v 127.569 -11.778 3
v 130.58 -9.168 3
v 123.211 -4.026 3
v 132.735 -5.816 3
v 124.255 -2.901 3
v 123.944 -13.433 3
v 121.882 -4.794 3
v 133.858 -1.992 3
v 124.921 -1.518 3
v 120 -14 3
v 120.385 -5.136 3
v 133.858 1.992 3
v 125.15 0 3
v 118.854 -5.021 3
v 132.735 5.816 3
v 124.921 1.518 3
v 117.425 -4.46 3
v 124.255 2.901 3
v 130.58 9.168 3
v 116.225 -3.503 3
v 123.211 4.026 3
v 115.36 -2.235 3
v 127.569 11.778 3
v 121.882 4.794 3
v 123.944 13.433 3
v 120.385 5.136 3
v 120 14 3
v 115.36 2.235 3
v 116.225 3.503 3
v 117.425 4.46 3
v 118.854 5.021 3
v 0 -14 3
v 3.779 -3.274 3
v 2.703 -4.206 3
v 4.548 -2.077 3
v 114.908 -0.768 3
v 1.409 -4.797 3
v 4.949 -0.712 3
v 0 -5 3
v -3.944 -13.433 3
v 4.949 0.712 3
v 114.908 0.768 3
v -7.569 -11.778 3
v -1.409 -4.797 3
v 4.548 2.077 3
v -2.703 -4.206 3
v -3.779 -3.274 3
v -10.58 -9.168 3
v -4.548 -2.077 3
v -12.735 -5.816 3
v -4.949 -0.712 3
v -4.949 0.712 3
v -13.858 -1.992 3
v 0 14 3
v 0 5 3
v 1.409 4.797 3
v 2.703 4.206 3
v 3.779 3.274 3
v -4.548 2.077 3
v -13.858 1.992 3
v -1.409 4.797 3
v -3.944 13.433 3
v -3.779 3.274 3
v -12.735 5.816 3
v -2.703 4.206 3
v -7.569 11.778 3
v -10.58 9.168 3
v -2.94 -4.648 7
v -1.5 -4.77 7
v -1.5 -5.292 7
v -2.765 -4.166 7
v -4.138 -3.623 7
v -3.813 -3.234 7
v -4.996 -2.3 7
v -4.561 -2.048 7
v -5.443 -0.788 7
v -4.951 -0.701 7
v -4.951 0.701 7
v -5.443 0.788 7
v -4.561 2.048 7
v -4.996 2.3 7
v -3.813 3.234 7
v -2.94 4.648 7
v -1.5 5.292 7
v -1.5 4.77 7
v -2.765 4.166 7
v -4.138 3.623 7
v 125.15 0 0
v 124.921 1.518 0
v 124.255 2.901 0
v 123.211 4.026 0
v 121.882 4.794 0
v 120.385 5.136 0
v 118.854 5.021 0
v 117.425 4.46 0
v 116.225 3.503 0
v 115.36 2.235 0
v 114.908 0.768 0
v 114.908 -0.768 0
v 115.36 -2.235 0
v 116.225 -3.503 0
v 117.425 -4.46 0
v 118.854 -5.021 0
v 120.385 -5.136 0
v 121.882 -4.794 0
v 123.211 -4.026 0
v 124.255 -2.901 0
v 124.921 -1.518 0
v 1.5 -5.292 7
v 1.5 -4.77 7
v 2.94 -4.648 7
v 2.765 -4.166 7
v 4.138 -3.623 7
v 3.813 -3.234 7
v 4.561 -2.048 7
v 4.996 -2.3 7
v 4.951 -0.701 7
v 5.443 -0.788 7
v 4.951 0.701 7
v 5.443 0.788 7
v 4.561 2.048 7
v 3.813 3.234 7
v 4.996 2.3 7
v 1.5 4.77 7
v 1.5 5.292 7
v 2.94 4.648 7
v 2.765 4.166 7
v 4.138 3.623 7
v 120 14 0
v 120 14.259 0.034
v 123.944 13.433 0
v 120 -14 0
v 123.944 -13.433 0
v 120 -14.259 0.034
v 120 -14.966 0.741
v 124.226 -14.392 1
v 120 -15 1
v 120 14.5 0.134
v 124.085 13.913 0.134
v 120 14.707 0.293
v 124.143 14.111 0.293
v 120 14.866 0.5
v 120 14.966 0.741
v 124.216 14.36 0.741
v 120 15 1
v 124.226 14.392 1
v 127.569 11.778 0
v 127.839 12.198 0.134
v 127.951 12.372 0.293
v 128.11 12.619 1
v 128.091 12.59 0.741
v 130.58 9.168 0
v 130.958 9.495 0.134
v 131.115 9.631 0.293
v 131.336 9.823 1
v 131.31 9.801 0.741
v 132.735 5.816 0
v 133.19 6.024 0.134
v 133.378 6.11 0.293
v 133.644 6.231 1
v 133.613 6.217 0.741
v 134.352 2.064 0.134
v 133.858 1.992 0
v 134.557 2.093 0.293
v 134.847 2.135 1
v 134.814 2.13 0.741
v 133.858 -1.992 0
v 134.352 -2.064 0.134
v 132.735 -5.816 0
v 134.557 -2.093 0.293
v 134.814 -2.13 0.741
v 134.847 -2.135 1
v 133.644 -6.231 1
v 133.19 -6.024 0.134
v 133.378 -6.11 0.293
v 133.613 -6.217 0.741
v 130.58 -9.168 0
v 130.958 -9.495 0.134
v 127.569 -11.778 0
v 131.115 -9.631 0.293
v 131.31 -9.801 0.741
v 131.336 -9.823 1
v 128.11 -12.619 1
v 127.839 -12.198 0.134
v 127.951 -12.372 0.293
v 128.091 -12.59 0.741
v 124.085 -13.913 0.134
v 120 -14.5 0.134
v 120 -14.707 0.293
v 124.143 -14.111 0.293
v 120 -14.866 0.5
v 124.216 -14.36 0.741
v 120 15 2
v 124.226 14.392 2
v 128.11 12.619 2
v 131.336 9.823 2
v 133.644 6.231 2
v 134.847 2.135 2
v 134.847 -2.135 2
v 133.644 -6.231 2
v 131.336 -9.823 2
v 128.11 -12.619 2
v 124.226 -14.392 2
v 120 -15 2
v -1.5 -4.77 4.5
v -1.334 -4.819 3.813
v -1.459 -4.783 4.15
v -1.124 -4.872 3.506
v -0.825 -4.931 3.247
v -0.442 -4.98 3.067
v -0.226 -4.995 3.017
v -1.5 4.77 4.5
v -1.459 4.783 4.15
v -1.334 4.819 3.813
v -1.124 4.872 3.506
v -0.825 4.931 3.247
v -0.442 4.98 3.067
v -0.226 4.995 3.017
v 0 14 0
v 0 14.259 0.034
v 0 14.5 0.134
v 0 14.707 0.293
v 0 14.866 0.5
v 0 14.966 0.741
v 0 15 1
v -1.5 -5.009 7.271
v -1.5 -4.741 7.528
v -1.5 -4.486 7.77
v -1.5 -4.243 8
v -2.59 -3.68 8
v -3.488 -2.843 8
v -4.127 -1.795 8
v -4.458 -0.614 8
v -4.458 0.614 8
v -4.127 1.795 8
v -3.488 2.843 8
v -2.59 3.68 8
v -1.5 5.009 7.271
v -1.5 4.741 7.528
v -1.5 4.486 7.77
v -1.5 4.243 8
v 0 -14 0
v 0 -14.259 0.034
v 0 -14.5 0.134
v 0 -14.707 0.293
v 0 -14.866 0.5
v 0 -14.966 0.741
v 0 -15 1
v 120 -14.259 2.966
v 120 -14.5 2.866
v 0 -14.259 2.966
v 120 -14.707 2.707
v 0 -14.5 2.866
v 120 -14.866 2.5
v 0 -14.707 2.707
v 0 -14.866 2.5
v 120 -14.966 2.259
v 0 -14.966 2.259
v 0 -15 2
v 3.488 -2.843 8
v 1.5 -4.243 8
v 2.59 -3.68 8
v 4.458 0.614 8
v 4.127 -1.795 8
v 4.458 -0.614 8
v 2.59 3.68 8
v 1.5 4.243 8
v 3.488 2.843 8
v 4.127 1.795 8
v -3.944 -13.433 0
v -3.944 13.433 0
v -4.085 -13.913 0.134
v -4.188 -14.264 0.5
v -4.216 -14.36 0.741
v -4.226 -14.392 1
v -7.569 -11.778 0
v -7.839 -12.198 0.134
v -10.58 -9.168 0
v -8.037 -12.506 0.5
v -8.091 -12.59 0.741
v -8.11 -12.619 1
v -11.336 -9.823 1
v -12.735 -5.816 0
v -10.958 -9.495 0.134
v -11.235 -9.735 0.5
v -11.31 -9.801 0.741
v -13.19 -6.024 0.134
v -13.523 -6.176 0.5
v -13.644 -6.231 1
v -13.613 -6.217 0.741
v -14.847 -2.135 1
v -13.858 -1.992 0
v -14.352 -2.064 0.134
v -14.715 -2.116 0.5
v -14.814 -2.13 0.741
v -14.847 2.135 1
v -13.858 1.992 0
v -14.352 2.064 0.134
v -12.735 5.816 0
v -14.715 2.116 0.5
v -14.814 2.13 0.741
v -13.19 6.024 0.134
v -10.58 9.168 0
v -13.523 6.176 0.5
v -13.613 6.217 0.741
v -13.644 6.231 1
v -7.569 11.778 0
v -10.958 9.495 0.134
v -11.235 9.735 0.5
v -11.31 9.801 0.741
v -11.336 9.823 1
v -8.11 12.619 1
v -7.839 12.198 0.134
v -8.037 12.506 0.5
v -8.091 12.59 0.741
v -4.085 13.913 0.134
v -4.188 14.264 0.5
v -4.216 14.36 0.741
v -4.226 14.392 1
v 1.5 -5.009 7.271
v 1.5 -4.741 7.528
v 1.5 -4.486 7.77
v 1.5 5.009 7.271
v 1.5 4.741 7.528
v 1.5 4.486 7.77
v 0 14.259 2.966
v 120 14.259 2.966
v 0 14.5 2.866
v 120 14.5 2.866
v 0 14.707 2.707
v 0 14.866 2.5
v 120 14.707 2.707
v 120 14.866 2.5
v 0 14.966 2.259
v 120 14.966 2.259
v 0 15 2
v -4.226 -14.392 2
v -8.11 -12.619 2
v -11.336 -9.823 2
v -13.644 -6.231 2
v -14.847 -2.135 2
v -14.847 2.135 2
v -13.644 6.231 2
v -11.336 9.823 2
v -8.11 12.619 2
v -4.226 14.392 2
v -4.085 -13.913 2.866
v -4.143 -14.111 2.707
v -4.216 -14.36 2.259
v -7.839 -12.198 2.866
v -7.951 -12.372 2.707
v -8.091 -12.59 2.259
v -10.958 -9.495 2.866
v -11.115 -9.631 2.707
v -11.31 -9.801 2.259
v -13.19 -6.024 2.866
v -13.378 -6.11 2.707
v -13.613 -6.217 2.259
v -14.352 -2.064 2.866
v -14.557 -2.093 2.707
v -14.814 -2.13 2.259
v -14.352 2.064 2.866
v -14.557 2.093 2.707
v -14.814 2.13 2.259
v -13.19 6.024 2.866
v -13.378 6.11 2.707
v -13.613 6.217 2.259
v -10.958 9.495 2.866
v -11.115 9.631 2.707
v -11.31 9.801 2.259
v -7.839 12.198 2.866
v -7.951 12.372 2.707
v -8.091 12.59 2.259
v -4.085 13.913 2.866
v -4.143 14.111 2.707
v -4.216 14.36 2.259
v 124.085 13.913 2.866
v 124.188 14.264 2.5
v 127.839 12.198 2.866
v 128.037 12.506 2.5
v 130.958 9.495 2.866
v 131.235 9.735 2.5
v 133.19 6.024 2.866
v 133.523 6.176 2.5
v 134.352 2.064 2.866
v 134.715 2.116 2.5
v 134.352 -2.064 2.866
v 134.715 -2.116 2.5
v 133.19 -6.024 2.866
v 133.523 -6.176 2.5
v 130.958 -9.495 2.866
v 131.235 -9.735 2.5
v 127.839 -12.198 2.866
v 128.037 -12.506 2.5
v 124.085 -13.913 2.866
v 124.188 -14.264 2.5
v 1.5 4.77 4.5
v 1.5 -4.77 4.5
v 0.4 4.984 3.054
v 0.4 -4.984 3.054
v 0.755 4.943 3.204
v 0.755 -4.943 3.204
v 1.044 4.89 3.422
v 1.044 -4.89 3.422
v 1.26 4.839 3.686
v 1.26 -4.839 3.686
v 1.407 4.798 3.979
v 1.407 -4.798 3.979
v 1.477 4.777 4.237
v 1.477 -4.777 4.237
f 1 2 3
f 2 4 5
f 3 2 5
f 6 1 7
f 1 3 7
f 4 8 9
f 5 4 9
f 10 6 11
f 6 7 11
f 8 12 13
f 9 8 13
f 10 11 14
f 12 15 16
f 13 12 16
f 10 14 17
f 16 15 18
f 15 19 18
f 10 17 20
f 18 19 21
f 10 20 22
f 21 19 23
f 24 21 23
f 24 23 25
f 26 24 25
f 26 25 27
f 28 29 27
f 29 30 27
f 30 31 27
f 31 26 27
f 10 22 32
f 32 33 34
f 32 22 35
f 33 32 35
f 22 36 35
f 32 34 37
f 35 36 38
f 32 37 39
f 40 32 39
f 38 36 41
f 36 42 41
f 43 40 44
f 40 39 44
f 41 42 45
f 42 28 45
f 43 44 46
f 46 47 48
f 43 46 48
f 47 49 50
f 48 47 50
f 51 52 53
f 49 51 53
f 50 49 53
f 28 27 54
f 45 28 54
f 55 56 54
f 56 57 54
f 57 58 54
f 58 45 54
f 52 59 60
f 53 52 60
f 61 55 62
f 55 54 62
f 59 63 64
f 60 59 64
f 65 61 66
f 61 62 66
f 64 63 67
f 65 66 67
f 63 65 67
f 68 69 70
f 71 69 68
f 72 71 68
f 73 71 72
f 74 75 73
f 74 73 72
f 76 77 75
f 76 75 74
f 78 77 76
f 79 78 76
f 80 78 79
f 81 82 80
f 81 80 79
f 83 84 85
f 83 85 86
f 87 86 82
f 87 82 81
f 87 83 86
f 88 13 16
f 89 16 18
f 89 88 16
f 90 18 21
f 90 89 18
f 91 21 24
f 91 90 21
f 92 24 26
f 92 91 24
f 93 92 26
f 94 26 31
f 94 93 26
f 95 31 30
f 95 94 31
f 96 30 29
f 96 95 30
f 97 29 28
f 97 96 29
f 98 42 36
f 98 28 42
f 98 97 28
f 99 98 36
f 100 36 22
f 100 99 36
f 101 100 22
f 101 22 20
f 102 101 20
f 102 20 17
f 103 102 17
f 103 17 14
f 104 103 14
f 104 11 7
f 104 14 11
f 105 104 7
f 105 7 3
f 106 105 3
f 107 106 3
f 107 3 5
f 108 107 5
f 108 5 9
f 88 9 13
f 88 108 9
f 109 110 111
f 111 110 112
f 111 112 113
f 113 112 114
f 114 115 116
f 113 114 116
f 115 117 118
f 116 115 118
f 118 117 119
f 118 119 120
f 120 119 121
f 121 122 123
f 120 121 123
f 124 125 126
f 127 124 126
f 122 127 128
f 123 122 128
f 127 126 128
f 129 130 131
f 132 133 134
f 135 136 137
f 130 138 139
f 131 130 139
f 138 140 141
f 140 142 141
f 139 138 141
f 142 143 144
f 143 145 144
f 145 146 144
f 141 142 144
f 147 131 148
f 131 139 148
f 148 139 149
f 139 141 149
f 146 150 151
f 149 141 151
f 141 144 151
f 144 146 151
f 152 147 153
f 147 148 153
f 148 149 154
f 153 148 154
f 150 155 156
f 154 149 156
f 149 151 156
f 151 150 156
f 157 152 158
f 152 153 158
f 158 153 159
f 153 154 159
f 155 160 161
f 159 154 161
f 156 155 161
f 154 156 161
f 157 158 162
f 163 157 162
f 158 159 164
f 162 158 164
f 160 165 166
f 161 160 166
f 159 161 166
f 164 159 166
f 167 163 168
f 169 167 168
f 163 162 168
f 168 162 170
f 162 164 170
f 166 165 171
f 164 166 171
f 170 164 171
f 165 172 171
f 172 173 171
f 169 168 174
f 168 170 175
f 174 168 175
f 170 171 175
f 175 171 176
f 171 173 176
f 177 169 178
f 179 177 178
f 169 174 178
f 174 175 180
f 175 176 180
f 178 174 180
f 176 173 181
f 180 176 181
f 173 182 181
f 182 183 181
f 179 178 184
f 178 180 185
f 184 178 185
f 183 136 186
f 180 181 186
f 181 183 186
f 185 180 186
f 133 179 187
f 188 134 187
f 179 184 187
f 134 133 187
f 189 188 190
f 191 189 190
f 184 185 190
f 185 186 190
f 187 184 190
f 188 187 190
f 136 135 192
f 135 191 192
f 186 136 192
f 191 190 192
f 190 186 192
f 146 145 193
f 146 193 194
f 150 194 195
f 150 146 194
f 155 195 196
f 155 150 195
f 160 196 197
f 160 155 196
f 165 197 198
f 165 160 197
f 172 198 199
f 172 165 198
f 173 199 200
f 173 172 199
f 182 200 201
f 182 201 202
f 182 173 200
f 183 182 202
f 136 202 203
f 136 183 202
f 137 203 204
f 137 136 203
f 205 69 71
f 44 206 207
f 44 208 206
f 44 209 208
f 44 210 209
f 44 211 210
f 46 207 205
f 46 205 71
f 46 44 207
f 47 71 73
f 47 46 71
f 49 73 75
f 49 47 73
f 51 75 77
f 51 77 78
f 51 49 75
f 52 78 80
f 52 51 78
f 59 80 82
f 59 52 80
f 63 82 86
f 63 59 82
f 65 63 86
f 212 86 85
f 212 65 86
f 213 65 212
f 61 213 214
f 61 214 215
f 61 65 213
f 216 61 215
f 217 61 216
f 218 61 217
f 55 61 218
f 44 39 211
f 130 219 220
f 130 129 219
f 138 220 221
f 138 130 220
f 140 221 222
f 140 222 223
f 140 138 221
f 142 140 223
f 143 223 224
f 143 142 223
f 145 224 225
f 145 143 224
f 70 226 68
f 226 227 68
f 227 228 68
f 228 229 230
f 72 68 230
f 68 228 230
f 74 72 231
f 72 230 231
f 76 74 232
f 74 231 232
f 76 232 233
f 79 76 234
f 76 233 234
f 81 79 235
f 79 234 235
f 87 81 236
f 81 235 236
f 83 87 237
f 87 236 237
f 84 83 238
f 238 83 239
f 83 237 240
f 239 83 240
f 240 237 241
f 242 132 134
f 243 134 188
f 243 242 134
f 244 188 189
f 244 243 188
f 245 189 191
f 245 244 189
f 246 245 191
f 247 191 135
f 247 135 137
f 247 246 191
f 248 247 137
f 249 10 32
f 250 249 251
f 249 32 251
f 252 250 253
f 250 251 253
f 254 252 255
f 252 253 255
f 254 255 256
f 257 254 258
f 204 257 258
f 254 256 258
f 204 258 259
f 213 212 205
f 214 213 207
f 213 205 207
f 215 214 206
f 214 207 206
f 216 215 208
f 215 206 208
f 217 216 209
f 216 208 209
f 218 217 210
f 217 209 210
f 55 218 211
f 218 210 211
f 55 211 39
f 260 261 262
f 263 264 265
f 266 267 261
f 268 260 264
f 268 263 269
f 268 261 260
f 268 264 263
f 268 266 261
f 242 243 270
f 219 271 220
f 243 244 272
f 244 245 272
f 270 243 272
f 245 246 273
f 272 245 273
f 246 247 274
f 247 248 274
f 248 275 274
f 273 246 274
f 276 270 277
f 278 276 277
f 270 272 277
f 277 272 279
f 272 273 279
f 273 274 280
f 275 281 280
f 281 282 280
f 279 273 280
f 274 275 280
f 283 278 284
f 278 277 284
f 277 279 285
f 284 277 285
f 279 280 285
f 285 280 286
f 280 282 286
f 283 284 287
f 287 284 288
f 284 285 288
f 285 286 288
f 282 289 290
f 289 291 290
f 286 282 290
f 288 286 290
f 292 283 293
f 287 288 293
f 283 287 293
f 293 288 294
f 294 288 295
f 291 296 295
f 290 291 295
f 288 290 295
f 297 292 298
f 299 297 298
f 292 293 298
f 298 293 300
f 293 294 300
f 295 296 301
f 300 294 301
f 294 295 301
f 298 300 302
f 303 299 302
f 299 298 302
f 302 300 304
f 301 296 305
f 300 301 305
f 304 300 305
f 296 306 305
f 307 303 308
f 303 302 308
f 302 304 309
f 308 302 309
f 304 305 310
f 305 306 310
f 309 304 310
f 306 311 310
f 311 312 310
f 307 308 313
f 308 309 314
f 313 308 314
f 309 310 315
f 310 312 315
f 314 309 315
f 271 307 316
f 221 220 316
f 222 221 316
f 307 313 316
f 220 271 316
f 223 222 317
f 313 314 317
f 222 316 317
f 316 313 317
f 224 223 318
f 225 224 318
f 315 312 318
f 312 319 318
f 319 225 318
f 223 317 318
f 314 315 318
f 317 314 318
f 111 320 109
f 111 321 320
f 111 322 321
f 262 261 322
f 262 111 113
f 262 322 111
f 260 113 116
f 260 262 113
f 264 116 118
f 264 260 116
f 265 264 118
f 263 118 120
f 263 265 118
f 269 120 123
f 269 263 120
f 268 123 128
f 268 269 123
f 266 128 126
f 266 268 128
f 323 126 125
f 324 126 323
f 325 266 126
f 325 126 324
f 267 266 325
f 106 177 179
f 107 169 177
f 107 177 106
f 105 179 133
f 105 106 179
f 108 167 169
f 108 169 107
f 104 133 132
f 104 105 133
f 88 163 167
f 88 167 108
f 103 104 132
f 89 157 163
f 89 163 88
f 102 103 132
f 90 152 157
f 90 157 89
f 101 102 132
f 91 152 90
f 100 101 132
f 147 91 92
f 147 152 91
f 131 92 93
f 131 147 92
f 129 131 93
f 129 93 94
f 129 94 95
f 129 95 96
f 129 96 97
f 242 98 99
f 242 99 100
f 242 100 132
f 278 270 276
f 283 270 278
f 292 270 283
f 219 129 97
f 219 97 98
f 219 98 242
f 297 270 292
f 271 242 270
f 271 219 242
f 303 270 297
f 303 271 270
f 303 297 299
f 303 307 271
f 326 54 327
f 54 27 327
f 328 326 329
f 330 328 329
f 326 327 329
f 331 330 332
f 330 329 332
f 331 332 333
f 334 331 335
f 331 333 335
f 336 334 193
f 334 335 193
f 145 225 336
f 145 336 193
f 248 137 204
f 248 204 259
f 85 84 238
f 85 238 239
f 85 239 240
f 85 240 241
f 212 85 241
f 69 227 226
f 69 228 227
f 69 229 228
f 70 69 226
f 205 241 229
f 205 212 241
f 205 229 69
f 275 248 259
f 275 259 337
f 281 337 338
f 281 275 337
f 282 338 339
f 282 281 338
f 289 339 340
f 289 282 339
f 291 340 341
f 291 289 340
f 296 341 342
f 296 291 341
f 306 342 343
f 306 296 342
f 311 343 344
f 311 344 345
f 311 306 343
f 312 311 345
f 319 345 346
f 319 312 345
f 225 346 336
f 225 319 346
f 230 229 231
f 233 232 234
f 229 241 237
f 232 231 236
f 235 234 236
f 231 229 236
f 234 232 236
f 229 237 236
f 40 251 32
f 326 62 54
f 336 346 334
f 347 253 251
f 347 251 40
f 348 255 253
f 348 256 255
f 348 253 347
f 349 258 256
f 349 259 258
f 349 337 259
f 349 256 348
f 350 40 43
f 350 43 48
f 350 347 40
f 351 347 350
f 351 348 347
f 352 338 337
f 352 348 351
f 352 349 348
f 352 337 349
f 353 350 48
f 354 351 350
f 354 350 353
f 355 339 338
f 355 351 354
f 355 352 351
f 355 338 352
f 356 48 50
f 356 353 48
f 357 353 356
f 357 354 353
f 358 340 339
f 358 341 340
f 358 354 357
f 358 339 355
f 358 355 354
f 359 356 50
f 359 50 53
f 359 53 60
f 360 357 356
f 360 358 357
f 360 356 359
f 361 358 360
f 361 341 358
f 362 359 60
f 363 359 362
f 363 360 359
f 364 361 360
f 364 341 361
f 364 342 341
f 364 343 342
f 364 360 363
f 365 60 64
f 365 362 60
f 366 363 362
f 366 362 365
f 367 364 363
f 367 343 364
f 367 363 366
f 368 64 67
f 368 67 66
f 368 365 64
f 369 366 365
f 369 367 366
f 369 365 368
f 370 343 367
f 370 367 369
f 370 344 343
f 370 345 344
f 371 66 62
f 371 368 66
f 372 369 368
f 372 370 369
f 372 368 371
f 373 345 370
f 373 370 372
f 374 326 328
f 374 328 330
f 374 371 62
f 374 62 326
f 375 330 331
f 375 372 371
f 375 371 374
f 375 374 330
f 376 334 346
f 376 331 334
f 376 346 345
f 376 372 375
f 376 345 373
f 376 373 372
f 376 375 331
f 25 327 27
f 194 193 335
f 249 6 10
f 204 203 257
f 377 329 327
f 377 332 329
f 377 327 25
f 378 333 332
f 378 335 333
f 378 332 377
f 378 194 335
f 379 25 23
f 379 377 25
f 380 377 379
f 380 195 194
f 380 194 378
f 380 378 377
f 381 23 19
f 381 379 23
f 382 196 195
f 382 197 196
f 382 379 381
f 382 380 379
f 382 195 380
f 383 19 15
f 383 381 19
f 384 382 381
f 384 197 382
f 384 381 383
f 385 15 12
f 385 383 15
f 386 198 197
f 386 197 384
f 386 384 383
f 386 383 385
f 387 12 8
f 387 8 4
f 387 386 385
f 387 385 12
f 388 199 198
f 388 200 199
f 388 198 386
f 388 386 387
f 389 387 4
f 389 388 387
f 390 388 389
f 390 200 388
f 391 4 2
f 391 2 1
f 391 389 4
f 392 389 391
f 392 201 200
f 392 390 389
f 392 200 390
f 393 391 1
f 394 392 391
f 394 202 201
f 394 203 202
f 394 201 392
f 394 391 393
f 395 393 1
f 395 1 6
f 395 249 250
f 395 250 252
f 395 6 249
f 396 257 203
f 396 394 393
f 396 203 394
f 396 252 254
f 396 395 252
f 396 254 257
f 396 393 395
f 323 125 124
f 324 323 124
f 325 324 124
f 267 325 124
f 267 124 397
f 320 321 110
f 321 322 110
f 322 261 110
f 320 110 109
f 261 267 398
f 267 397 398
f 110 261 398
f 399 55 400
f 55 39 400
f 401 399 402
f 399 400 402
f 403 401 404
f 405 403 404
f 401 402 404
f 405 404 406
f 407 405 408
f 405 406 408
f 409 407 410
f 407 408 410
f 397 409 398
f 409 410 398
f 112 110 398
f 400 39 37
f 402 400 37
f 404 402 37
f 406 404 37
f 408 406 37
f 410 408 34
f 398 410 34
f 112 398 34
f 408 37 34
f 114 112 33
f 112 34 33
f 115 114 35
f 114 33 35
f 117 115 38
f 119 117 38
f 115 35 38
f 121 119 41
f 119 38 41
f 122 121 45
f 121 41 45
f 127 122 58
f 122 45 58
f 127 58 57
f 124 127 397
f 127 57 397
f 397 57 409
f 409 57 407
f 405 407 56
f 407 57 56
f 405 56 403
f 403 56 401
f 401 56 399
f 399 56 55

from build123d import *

# Parameters (mm, degrees)
EXTRUDE_1_DEPTH     = 3
EXTRUDE_2_DEPTH     = 4
EXTRUDE_3_DEPTH     = 1
CHAMFER_1_SIZE      = 1
SKETCH_1_3_R        = 5.15
CUT_EXTRUDE_1_DEPTH = 5
FILLET_1_R          = 1.5
FILLET_2_R          = 1


with BuildPart() as part:
    # 草图1 → 凸台-拉伸1 (new body)
    with BuildSketch(Plane.XY):
        with BuildLine():
            Line((0, 15), (120, 15))
            ThreePointArc((120, 15), (135, 0), (120, -15))
            Line((120, -15), (0, -15))
            ThreePointArc((0, -15), (-15, 0), (0, 15))
        make_face()
    extrude(amount=EXTRUDE_1_DEPTH)

    # 草图2 → 凸台-拉伸2 (add)
    with BuildSketch(Plane.XY.offset(3)):
        with BuildLine():
            Line((-1.5, 4.769696007), (-1.5, -4.769696007))
            ThreePointArc((-1.5, -4.769696007), (-5, 0), (-1.5, 4.769696007))
        make_face()
        with BuildLine():
            Line((1.5, 4.769696007), (1.5, -4.769696007))
            ThreePointArc((1.5, -4.769696007), (5, 0), (1.5, 4.769696007))
        make_face()
    extrude(amount=EXTRUDE_2_DEPTH)

    # 草图5 → 凸台-拉伸3 (add)
    with BuildSketch(Plane.XY.offset(7)):
        with BuildLine():
            Line((-1.5, 5.291502622), (-1.5, -5.291502622))
            ThreePointArc((-1.5, -5.291502622), (-5.5, 0), (-1.5, 5.291502622))
        make_face()
        with BuildLine():
            Line((1.5, 5.291502622), (1.5, -5.291502622))
            ThreePointArc((1.5, -5.291502622), (5.5, 0), (1.5, 5.291502622))
        make_face()
    extrude(amount=EXTRUDE_3_DEPTH)

    # 倒角1
    chamfer_1_edges = [part.edges().sort_by_distance(p)[0] for p in [
        (5.5, 0, 8),
        (-5.5, 0, 8),
    ]]
    chamfer(chamfer_1_edges, length=CHAMFER_1_SIZE - 0.0001)  # a hair under: the kernel refuses the full size

    # 草图1<3> → 切除-拉伸1 (cut)
    with BuildSketch(Plane.XY):
        with Locations((120, 0)):
            Circle(SKETCH_1_3_R)
    extrude(amount=CUT_EXTRUDE_1_DEPTH, mode=Mode.SUBTRACT)

    # 圆角1
    fillet_1_edges = [part.edges().sort_by_distance(p)[0] for p in [
        (-1.5, 0, 3),
        (1.5, 0, 3),
    ]]
    fillet(fillet_1_edges, radius=FILLET_1_R - 0.0001)  # a hair under: the kernel refuses the full size

    # 圆角2
    fillet_2_edges = [part.edges().sort_by_distance(p)[0] for p in [
        (135, 0, 3),
        (60, 15, 3),
        (-15, 0, 3),
        (60, 15, 0),
        (135, 0, 0),
        (60, -15, 0),
        (-15, 0, 0),
        (60, -15, 3),
    ]]
    fillet(fillet_2_edges, radius=FILLET_2_R)


solid = part.part
